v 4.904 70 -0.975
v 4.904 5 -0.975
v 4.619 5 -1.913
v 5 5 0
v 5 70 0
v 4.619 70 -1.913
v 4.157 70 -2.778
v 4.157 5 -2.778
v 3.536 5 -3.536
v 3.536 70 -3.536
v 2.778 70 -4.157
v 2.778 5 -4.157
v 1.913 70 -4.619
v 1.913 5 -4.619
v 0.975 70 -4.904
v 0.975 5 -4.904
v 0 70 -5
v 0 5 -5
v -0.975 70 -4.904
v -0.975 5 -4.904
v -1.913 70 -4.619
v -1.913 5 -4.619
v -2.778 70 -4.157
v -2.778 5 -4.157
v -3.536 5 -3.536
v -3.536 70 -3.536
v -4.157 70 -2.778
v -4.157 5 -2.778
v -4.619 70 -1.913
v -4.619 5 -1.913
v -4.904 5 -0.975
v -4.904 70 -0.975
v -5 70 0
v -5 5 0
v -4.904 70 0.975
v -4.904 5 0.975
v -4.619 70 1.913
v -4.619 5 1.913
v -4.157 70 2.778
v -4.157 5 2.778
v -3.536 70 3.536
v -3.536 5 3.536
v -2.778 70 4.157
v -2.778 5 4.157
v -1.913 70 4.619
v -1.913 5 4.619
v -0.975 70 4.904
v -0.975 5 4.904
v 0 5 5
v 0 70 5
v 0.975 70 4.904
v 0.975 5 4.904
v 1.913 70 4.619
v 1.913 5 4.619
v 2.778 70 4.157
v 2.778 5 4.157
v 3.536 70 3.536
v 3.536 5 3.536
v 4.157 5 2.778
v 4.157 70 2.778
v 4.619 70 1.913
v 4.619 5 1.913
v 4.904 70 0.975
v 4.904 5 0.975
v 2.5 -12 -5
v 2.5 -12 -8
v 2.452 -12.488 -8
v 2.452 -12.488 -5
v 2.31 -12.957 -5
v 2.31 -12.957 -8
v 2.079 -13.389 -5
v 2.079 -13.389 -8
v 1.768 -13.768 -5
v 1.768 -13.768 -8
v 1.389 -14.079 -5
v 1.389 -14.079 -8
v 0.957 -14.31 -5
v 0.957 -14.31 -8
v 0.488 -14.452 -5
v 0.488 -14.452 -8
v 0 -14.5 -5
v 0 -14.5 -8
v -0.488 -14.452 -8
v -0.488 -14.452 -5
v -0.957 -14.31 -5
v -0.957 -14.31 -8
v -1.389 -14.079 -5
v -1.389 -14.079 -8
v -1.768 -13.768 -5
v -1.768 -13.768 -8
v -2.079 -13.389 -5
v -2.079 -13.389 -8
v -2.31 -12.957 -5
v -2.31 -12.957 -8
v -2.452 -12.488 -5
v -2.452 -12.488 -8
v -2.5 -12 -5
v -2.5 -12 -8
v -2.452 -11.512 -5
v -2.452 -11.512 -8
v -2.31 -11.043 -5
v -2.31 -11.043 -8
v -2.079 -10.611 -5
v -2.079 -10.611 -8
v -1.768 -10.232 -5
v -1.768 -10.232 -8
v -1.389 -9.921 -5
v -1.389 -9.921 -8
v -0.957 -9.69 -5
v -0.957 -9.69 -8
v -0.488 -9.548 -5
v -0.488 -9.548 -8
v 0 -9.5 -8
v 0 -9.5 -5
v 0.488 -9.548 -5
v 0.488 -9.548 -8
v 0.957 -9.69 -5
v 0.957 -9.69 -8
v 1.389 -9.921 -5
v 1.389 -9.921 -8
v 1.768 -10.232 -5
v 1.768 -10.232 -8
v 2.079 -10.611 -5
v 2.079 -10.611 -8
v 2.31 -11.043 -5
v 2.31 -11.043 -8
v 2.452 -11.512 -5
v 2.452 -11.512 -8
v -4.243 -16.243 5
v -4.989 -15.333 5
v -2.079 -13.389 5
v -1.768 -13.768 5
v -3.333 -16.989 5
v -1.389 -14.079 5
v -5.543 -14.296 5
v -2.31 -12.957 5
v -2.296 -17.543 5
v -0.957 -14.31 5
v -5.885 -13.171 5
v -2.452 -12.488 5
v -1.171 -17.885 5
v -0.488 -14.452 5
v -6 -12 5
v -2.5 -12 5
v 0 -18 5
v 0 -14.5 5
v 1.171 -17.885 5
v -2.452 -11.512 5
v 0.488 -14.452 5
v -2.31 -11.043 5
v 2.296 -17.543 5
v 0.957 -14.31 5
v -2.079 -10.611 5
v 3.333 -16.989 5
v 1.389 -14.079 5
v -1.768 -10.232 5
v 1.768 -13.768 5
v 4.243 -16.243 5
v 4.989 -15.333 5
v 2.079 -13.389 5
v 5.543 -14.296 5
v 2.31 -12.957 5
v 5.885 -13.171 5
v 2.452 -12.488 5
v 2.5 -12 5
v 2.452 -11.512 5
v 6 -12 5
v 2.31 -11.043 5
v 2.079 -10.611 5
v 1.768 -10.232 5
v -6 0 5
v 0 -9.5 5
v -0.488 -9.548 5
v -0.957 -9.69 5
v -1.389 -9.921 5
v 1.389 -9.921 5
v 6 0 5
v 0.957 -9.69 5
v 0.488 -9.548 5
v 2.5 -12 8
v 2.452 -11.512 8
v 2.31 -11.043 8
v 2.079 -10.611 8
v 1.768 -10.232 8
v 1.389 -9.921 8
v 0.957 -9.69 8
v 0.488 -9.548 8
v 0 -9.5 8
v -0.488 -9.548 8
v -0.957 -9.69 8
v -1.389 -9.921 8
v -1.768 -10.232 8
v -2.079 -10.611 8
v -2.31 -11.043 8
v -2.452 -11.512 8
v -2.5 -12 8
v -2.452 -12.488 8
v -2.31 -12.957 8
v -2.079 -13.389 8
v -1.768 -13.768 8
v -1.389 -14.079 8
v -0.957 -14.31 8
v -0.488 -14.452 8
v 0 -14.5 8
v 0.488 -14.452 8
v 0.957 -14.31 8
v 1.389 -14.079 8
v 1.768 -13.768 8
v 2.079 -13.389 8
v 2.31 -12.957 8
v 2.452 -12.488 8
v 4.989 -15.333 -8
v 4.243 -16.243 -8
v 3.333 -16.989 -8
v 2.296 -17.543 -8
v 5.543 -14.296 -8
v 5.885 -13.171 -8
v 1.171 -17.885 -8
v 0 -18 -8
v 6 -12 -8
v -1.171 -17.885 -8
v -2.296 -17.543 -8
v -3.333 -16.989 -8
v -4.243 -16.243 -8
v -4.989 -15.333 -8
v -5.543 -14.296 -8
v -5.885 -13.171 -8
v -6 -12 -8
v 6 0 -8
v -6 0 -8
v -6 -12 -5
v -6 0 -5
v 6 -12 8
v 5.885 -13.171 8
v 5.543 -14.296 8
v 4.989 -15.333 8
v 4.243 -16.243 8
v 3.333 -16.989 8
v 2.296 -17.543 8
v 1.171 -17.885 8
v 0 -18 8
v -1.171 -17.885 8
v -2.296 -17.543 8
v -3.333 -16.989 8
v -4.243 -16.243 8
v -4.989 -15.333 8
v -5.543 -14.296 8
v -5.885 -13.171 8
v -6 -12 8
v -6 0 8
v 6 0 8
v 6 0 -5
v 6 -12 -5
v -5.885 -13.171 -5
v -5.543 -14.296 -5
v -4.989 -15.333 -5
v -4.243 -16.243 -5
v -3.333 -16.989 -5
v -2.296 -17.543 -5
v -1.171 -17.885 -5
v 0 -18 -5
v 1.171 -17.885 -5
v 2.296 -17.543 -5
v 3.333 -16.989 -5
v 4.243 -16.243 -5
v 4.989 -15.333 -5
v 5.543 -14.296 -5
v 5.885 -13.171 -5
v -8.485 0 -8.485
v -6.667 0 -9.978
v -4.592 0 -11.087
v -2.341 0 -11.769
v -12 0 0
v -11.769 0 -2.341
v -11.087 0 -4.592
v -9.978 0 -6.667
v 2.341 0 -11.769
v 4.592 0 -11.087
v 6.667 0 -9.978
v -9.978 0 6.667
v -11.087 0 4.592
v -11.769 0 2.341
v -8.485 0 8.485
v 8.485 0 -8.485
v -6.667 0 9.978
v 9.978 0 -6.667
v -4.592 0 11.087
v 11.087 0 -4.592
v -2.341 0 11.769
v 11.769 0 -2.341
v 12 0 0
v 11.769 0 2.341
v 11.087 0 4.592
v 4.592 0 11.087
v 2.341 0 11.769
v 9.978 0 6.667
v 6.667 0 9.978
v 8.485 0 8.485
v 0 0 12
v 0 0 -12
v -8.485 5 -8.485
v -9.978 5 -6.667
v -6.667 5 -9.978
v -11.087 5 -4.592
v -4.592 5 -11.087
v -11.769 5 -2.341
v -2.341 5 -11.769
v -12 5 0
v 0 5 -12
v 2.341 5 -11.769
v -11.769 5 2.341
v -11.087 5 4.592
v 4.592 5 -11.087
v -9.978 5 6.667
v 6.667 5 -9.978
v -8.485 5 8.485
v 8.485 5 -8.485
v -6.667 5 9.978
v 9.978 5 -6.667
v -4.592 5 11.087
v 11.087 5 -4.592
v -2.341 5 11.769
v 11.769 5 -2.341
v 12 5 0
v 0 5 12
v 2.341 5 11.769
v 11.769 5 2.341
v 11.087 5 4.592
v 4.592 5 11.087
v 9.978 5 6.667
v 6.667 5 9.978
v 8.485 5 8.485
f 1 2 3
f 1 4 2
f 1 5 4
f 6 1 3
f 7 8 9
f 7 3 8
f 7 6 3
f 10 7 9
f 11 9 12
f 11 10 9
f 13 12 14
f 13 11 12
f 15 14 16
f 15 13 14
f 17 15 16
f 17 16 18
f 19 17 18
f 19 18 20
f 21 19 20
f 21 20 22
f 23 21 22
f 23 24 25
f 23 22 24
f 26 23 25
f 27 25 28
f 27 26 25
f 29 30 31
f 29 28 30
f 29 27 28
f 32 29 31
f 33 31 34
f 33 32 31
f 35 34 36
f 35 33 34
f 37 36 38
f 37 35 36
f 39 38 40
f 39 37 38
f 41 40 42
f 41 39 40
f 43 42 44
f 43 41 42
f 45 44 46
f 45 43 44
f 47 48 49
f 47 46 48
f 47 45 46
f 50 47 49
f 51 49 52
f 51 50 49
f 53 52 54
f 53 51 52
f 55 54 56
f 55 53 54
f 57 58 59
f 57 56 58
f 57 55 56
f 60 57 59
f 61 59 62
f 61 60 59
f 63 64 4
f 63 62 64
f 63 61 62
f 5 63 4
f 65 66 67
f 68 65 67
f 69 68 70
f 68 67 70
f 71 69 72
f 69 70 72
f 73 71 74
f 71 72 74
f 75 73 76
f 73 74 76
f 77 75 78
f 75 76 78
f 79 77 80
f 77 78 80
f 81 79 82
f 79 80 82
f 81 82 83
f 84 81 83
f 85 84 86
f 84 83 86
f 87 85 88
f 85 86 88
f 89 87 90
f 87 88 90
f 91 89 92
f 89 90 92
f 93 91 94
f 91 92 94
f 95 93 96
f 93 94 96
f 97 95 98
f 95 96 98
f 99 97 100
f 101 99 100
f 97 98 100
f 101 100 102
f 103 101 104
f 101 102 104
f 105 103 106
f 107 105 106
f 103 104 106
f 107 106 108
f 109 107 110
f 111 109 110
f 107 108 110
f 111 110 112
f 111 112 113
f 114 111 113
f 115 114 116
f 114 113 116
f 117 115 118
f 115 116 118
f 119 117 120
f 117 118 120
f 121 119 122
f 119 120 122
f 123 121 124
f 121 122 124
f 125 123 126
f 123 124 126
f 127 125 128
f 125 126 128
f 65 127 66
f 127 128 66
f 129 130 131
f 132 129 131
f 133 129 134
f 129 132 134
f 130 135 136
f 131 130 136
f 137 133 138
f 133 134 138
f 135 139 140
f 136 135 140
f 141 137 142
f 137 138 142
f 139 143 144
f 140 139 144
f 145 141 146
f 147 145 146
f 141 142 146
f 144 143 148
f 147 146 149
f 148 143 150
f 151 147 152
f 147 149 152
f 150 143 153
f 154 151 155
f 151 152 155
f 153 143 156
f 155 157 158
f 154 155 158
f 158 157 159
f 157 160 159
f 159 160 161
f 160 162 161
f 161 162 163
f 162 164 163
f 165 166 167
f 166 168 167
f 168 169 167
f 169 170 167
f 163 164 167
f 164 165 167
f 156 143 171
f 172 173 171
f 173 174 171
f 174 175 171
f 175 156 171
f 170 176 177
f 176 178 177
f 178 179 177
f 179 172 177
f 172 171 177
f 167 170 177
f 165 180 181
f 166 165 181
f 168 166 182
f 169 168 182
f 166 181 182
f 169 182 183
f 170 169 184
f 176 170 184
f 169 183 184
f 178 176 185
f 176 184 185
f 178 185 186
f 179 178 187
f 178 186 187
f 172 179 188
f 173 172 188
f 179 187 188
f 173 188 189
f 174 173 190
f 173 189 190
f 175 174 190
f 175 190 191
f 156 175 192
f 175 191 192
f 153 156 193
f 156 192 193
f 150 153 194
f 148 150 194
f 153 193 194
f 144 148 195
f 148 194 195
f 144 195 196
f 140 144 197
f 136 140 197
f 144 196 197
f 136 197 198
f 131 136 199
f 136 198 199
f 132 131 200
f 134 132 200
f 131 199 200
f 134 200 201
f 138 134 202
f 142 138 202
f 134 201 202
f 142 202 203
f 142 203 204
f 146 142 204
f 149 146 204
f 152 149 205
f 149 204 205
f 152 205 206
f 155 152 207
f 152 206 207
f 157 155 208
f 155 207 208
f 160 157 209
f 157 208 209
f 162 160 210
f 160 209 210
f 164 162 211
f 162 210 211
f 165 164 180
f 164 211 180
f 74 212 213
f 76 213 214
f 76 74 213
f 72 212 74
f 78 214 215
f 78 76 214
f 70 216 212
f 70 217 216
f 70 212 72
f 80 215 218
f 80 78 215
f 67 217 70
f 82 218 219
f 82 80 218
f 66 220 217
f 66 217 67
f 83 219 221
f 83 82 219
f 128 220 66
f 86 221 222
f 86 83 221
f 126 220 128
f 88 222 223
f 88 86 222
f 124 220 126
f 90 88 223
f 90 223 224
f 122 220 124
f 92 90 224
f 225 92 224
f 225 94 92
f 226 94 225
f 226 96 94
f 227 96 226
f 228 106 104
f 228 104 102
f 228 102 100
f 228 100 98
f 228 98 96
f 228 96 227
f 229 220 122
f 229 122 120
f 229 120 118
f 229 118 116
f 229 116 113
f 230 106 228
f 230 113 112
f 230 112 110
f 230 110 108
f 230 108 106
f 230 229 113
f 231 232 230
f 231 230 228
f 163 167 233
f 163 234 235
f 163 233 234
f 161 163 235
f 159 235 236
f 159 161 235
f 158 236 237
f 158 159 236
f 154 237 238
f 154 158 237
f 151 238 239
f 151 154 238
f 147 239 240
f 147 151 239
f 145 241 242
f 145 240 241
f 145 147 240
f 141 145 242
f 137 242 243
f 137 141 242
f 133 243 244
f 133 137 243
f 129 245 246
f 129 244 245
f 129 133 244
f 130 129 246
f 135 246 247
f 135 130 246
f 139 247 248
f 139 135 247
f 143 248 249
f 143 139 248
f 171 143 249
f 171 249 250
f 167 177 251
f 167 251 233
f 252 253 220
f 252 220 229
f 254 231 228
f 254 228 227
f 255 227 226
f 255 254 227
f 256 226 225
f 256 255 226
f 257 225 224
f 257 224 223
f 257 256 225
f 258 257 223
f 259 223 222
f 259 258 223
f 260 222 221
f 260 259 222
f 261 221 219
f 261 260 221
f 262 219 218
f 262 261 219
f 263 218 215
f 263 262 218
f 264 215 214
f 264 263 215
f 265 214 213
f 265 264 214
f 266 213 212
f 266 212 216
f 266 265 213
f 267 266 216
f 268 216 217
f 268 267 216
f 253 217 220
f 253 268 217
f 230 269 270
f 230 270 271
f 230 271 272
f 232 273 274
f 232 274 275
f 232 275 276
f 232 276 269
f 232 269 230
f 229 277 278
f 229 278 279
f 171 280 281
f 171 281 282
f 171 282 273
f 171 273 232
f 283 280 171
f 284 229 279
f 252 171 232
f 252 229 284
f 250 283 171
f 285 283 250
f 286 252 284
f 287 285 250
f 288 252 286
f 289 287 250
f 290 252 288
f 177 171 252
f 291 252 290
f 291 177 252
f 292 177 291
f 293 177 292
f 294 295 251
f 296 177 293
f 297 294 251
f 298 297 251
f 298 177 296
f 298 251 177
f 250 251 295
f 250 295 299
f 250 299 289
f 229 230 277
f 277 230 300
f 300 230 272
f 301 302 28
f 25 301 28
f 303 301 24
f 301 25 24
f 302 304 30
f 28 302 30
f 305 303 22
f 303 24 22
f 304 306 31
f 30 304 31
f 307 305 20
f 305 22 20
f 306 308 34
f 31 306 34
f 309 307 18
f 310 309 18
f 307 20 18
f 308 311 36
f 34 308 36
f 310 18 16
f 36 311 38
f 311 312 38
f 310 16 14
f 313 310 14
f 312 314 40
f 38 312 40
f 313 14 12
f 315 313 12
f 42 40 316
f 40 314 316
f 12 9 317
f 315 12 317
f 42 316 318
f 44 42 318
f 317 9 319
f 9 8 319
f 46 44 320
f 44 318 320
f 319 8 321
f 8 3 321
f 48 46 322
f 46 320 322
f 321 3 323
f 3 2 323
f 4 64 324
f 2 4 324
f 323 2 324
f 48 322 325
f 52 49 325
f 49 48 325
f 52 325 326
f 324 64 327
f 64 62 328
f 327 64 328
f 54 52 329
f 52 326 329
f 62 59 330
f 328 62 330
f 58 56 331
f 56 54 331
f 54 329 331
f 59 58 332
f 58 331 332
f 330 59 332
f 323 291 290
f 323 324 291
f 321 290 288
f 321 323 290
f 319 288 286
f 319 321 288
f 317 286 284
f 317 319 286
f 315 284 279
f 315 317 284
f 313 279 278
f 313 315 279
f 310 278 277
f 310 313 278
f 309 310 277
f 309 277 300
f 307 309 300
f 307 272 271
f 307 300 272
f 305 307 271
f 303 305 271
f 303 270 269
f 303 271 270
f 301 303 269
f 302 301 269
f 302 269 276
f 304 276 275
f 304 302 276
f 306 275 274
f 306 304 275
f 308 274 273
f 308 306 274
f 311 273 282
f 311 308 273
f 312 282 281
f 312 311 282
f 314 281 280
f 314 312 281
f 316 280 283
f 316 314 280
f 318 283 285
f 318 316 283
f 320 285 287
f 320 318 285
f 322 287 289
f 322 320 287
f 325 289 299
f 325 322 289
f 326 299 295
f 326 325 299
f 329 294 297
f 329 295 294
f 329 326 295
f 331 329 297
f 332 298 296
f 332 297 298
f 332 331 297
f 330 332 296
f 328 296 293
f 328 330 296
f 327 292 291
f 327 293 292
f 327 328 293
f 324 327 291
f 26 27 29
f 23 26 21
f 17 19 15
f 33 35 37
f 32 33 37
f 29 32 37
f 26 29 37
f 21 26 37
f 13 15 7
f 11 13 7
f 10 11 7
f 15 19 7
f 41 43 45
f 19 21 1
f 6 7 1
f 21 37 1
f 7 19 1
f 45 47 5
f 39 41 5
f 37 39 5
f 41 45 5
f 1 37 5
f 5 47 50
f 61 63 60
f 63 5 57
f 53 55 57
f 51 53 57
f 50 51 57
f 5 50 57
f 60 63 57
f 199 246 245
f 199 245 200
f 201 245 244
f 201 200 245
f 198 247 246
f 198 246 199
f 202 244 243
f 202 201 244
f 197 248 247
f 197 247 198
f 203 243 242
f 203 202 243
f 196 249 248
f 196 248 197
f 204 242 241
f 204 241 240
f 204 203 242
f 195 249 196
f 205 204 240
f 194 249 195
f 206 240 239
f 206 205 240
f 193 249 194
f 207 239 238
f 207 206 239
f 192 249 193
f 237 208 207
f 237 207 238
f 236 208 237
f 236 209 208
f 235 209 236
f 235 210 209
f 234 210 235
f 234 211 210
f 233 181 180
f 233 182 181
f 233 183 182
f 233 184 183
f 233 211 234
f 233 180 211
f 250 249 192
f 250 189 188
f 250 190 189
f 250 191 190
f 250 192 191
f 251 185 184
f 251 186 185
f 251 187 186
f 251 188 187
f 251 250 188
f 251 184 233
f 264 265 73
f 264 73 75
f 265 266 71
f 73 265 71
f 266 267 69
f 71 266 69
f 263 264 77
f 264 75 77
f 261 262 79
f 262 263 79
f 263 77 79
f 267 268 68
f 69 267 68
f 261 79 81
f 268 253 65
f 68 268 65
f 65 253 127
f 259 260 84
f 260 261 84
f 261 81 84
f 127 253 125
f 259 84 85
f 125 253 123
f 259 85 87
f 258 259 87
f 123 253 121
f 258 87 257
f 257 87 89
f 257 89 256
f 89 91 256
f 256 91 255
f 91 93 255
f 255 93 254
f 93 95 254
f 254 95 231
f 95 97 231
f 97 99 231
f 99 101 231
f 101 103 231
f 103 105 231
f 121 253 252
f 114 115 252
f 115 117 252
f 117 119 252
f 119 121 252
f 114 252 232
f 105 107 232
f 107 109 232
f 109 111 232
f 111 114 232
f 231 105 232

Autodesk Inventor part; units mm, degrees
ref_plane "YZ Plane" through (0, 0, 0) normal (1, 0, 0) x (0, 1, 0)
ref_plane "XZ Plane" through (0, 0, 0) normal (0, 1, 0) x (-1, 0, 0)
sketch "草圖1" plane through (0, 0, 0) normal (0, 0, 1) x (1, 0, 0)
  line L0 (0, 0) -> (5, 0)
  line L1 (5, 0) -> (5, 70)
  line L2 (5, 70) -> (0, 70)
  line L3 (0, 70) -> (0, 0)
  line L4 (0, 0) -> (12, 0)
  line L5 (12, 0) -> (12, 5)
  line L6 (12, 5) -> (0, 5)
  line L7 (0, 5) -> (0, 0)
  dimension "d0" = 10
  dimension "d1" = 70
  dimension "d2" = 5
  dimension "d3" = 12
revolve "迴轉1" add sketch "草圖1" angle 360 about axis through (0, 70, 0) along (0, -1, 0)
ref_plane "工作平面1" through (0, 0, 5) normal (0, 0, 1) x (1, 0, 0)
sketch "草圖2" plane through (0, 0, 5) normal (0, 0, 1) x (1, 0, 0)
  line L0 (-6, 0) -> (6, 0)
  line L1 (6, 0) -> (6, -12)
  line L2 (6, -12) -> (-6, -12)
  line L3 (-6, -12) -> (-6, 0)
  line L4 (-12, 0) -> (12, 0) projected
  circle A0 centre (0, -12) radius 6
  point P0 (0, 0)
  dimension "d6" = 12
  dimension "d7" = 12
extrude "擠出1" add sketch "草圖2" along normal blind 3
sketch "草圖3" plane through (0, 0, 8) normal (0, 0, 1) x (1, 0, 0)
  arc A0 (-6, -12) -> (6, -12) centre (0, -12) ccw projected
  circle A1 centre (0, -12) radius 2.5
  point P0 (0, 0)
  dimension "d10" = 5
extrude "擠出2" cut sketch "草圖3" against normal through all
mirror "鏡射1" about plane through (0, 0, 0) normal (0, 0, 1) of "擠出2", "擠出1"
properties part number "從動桿"
